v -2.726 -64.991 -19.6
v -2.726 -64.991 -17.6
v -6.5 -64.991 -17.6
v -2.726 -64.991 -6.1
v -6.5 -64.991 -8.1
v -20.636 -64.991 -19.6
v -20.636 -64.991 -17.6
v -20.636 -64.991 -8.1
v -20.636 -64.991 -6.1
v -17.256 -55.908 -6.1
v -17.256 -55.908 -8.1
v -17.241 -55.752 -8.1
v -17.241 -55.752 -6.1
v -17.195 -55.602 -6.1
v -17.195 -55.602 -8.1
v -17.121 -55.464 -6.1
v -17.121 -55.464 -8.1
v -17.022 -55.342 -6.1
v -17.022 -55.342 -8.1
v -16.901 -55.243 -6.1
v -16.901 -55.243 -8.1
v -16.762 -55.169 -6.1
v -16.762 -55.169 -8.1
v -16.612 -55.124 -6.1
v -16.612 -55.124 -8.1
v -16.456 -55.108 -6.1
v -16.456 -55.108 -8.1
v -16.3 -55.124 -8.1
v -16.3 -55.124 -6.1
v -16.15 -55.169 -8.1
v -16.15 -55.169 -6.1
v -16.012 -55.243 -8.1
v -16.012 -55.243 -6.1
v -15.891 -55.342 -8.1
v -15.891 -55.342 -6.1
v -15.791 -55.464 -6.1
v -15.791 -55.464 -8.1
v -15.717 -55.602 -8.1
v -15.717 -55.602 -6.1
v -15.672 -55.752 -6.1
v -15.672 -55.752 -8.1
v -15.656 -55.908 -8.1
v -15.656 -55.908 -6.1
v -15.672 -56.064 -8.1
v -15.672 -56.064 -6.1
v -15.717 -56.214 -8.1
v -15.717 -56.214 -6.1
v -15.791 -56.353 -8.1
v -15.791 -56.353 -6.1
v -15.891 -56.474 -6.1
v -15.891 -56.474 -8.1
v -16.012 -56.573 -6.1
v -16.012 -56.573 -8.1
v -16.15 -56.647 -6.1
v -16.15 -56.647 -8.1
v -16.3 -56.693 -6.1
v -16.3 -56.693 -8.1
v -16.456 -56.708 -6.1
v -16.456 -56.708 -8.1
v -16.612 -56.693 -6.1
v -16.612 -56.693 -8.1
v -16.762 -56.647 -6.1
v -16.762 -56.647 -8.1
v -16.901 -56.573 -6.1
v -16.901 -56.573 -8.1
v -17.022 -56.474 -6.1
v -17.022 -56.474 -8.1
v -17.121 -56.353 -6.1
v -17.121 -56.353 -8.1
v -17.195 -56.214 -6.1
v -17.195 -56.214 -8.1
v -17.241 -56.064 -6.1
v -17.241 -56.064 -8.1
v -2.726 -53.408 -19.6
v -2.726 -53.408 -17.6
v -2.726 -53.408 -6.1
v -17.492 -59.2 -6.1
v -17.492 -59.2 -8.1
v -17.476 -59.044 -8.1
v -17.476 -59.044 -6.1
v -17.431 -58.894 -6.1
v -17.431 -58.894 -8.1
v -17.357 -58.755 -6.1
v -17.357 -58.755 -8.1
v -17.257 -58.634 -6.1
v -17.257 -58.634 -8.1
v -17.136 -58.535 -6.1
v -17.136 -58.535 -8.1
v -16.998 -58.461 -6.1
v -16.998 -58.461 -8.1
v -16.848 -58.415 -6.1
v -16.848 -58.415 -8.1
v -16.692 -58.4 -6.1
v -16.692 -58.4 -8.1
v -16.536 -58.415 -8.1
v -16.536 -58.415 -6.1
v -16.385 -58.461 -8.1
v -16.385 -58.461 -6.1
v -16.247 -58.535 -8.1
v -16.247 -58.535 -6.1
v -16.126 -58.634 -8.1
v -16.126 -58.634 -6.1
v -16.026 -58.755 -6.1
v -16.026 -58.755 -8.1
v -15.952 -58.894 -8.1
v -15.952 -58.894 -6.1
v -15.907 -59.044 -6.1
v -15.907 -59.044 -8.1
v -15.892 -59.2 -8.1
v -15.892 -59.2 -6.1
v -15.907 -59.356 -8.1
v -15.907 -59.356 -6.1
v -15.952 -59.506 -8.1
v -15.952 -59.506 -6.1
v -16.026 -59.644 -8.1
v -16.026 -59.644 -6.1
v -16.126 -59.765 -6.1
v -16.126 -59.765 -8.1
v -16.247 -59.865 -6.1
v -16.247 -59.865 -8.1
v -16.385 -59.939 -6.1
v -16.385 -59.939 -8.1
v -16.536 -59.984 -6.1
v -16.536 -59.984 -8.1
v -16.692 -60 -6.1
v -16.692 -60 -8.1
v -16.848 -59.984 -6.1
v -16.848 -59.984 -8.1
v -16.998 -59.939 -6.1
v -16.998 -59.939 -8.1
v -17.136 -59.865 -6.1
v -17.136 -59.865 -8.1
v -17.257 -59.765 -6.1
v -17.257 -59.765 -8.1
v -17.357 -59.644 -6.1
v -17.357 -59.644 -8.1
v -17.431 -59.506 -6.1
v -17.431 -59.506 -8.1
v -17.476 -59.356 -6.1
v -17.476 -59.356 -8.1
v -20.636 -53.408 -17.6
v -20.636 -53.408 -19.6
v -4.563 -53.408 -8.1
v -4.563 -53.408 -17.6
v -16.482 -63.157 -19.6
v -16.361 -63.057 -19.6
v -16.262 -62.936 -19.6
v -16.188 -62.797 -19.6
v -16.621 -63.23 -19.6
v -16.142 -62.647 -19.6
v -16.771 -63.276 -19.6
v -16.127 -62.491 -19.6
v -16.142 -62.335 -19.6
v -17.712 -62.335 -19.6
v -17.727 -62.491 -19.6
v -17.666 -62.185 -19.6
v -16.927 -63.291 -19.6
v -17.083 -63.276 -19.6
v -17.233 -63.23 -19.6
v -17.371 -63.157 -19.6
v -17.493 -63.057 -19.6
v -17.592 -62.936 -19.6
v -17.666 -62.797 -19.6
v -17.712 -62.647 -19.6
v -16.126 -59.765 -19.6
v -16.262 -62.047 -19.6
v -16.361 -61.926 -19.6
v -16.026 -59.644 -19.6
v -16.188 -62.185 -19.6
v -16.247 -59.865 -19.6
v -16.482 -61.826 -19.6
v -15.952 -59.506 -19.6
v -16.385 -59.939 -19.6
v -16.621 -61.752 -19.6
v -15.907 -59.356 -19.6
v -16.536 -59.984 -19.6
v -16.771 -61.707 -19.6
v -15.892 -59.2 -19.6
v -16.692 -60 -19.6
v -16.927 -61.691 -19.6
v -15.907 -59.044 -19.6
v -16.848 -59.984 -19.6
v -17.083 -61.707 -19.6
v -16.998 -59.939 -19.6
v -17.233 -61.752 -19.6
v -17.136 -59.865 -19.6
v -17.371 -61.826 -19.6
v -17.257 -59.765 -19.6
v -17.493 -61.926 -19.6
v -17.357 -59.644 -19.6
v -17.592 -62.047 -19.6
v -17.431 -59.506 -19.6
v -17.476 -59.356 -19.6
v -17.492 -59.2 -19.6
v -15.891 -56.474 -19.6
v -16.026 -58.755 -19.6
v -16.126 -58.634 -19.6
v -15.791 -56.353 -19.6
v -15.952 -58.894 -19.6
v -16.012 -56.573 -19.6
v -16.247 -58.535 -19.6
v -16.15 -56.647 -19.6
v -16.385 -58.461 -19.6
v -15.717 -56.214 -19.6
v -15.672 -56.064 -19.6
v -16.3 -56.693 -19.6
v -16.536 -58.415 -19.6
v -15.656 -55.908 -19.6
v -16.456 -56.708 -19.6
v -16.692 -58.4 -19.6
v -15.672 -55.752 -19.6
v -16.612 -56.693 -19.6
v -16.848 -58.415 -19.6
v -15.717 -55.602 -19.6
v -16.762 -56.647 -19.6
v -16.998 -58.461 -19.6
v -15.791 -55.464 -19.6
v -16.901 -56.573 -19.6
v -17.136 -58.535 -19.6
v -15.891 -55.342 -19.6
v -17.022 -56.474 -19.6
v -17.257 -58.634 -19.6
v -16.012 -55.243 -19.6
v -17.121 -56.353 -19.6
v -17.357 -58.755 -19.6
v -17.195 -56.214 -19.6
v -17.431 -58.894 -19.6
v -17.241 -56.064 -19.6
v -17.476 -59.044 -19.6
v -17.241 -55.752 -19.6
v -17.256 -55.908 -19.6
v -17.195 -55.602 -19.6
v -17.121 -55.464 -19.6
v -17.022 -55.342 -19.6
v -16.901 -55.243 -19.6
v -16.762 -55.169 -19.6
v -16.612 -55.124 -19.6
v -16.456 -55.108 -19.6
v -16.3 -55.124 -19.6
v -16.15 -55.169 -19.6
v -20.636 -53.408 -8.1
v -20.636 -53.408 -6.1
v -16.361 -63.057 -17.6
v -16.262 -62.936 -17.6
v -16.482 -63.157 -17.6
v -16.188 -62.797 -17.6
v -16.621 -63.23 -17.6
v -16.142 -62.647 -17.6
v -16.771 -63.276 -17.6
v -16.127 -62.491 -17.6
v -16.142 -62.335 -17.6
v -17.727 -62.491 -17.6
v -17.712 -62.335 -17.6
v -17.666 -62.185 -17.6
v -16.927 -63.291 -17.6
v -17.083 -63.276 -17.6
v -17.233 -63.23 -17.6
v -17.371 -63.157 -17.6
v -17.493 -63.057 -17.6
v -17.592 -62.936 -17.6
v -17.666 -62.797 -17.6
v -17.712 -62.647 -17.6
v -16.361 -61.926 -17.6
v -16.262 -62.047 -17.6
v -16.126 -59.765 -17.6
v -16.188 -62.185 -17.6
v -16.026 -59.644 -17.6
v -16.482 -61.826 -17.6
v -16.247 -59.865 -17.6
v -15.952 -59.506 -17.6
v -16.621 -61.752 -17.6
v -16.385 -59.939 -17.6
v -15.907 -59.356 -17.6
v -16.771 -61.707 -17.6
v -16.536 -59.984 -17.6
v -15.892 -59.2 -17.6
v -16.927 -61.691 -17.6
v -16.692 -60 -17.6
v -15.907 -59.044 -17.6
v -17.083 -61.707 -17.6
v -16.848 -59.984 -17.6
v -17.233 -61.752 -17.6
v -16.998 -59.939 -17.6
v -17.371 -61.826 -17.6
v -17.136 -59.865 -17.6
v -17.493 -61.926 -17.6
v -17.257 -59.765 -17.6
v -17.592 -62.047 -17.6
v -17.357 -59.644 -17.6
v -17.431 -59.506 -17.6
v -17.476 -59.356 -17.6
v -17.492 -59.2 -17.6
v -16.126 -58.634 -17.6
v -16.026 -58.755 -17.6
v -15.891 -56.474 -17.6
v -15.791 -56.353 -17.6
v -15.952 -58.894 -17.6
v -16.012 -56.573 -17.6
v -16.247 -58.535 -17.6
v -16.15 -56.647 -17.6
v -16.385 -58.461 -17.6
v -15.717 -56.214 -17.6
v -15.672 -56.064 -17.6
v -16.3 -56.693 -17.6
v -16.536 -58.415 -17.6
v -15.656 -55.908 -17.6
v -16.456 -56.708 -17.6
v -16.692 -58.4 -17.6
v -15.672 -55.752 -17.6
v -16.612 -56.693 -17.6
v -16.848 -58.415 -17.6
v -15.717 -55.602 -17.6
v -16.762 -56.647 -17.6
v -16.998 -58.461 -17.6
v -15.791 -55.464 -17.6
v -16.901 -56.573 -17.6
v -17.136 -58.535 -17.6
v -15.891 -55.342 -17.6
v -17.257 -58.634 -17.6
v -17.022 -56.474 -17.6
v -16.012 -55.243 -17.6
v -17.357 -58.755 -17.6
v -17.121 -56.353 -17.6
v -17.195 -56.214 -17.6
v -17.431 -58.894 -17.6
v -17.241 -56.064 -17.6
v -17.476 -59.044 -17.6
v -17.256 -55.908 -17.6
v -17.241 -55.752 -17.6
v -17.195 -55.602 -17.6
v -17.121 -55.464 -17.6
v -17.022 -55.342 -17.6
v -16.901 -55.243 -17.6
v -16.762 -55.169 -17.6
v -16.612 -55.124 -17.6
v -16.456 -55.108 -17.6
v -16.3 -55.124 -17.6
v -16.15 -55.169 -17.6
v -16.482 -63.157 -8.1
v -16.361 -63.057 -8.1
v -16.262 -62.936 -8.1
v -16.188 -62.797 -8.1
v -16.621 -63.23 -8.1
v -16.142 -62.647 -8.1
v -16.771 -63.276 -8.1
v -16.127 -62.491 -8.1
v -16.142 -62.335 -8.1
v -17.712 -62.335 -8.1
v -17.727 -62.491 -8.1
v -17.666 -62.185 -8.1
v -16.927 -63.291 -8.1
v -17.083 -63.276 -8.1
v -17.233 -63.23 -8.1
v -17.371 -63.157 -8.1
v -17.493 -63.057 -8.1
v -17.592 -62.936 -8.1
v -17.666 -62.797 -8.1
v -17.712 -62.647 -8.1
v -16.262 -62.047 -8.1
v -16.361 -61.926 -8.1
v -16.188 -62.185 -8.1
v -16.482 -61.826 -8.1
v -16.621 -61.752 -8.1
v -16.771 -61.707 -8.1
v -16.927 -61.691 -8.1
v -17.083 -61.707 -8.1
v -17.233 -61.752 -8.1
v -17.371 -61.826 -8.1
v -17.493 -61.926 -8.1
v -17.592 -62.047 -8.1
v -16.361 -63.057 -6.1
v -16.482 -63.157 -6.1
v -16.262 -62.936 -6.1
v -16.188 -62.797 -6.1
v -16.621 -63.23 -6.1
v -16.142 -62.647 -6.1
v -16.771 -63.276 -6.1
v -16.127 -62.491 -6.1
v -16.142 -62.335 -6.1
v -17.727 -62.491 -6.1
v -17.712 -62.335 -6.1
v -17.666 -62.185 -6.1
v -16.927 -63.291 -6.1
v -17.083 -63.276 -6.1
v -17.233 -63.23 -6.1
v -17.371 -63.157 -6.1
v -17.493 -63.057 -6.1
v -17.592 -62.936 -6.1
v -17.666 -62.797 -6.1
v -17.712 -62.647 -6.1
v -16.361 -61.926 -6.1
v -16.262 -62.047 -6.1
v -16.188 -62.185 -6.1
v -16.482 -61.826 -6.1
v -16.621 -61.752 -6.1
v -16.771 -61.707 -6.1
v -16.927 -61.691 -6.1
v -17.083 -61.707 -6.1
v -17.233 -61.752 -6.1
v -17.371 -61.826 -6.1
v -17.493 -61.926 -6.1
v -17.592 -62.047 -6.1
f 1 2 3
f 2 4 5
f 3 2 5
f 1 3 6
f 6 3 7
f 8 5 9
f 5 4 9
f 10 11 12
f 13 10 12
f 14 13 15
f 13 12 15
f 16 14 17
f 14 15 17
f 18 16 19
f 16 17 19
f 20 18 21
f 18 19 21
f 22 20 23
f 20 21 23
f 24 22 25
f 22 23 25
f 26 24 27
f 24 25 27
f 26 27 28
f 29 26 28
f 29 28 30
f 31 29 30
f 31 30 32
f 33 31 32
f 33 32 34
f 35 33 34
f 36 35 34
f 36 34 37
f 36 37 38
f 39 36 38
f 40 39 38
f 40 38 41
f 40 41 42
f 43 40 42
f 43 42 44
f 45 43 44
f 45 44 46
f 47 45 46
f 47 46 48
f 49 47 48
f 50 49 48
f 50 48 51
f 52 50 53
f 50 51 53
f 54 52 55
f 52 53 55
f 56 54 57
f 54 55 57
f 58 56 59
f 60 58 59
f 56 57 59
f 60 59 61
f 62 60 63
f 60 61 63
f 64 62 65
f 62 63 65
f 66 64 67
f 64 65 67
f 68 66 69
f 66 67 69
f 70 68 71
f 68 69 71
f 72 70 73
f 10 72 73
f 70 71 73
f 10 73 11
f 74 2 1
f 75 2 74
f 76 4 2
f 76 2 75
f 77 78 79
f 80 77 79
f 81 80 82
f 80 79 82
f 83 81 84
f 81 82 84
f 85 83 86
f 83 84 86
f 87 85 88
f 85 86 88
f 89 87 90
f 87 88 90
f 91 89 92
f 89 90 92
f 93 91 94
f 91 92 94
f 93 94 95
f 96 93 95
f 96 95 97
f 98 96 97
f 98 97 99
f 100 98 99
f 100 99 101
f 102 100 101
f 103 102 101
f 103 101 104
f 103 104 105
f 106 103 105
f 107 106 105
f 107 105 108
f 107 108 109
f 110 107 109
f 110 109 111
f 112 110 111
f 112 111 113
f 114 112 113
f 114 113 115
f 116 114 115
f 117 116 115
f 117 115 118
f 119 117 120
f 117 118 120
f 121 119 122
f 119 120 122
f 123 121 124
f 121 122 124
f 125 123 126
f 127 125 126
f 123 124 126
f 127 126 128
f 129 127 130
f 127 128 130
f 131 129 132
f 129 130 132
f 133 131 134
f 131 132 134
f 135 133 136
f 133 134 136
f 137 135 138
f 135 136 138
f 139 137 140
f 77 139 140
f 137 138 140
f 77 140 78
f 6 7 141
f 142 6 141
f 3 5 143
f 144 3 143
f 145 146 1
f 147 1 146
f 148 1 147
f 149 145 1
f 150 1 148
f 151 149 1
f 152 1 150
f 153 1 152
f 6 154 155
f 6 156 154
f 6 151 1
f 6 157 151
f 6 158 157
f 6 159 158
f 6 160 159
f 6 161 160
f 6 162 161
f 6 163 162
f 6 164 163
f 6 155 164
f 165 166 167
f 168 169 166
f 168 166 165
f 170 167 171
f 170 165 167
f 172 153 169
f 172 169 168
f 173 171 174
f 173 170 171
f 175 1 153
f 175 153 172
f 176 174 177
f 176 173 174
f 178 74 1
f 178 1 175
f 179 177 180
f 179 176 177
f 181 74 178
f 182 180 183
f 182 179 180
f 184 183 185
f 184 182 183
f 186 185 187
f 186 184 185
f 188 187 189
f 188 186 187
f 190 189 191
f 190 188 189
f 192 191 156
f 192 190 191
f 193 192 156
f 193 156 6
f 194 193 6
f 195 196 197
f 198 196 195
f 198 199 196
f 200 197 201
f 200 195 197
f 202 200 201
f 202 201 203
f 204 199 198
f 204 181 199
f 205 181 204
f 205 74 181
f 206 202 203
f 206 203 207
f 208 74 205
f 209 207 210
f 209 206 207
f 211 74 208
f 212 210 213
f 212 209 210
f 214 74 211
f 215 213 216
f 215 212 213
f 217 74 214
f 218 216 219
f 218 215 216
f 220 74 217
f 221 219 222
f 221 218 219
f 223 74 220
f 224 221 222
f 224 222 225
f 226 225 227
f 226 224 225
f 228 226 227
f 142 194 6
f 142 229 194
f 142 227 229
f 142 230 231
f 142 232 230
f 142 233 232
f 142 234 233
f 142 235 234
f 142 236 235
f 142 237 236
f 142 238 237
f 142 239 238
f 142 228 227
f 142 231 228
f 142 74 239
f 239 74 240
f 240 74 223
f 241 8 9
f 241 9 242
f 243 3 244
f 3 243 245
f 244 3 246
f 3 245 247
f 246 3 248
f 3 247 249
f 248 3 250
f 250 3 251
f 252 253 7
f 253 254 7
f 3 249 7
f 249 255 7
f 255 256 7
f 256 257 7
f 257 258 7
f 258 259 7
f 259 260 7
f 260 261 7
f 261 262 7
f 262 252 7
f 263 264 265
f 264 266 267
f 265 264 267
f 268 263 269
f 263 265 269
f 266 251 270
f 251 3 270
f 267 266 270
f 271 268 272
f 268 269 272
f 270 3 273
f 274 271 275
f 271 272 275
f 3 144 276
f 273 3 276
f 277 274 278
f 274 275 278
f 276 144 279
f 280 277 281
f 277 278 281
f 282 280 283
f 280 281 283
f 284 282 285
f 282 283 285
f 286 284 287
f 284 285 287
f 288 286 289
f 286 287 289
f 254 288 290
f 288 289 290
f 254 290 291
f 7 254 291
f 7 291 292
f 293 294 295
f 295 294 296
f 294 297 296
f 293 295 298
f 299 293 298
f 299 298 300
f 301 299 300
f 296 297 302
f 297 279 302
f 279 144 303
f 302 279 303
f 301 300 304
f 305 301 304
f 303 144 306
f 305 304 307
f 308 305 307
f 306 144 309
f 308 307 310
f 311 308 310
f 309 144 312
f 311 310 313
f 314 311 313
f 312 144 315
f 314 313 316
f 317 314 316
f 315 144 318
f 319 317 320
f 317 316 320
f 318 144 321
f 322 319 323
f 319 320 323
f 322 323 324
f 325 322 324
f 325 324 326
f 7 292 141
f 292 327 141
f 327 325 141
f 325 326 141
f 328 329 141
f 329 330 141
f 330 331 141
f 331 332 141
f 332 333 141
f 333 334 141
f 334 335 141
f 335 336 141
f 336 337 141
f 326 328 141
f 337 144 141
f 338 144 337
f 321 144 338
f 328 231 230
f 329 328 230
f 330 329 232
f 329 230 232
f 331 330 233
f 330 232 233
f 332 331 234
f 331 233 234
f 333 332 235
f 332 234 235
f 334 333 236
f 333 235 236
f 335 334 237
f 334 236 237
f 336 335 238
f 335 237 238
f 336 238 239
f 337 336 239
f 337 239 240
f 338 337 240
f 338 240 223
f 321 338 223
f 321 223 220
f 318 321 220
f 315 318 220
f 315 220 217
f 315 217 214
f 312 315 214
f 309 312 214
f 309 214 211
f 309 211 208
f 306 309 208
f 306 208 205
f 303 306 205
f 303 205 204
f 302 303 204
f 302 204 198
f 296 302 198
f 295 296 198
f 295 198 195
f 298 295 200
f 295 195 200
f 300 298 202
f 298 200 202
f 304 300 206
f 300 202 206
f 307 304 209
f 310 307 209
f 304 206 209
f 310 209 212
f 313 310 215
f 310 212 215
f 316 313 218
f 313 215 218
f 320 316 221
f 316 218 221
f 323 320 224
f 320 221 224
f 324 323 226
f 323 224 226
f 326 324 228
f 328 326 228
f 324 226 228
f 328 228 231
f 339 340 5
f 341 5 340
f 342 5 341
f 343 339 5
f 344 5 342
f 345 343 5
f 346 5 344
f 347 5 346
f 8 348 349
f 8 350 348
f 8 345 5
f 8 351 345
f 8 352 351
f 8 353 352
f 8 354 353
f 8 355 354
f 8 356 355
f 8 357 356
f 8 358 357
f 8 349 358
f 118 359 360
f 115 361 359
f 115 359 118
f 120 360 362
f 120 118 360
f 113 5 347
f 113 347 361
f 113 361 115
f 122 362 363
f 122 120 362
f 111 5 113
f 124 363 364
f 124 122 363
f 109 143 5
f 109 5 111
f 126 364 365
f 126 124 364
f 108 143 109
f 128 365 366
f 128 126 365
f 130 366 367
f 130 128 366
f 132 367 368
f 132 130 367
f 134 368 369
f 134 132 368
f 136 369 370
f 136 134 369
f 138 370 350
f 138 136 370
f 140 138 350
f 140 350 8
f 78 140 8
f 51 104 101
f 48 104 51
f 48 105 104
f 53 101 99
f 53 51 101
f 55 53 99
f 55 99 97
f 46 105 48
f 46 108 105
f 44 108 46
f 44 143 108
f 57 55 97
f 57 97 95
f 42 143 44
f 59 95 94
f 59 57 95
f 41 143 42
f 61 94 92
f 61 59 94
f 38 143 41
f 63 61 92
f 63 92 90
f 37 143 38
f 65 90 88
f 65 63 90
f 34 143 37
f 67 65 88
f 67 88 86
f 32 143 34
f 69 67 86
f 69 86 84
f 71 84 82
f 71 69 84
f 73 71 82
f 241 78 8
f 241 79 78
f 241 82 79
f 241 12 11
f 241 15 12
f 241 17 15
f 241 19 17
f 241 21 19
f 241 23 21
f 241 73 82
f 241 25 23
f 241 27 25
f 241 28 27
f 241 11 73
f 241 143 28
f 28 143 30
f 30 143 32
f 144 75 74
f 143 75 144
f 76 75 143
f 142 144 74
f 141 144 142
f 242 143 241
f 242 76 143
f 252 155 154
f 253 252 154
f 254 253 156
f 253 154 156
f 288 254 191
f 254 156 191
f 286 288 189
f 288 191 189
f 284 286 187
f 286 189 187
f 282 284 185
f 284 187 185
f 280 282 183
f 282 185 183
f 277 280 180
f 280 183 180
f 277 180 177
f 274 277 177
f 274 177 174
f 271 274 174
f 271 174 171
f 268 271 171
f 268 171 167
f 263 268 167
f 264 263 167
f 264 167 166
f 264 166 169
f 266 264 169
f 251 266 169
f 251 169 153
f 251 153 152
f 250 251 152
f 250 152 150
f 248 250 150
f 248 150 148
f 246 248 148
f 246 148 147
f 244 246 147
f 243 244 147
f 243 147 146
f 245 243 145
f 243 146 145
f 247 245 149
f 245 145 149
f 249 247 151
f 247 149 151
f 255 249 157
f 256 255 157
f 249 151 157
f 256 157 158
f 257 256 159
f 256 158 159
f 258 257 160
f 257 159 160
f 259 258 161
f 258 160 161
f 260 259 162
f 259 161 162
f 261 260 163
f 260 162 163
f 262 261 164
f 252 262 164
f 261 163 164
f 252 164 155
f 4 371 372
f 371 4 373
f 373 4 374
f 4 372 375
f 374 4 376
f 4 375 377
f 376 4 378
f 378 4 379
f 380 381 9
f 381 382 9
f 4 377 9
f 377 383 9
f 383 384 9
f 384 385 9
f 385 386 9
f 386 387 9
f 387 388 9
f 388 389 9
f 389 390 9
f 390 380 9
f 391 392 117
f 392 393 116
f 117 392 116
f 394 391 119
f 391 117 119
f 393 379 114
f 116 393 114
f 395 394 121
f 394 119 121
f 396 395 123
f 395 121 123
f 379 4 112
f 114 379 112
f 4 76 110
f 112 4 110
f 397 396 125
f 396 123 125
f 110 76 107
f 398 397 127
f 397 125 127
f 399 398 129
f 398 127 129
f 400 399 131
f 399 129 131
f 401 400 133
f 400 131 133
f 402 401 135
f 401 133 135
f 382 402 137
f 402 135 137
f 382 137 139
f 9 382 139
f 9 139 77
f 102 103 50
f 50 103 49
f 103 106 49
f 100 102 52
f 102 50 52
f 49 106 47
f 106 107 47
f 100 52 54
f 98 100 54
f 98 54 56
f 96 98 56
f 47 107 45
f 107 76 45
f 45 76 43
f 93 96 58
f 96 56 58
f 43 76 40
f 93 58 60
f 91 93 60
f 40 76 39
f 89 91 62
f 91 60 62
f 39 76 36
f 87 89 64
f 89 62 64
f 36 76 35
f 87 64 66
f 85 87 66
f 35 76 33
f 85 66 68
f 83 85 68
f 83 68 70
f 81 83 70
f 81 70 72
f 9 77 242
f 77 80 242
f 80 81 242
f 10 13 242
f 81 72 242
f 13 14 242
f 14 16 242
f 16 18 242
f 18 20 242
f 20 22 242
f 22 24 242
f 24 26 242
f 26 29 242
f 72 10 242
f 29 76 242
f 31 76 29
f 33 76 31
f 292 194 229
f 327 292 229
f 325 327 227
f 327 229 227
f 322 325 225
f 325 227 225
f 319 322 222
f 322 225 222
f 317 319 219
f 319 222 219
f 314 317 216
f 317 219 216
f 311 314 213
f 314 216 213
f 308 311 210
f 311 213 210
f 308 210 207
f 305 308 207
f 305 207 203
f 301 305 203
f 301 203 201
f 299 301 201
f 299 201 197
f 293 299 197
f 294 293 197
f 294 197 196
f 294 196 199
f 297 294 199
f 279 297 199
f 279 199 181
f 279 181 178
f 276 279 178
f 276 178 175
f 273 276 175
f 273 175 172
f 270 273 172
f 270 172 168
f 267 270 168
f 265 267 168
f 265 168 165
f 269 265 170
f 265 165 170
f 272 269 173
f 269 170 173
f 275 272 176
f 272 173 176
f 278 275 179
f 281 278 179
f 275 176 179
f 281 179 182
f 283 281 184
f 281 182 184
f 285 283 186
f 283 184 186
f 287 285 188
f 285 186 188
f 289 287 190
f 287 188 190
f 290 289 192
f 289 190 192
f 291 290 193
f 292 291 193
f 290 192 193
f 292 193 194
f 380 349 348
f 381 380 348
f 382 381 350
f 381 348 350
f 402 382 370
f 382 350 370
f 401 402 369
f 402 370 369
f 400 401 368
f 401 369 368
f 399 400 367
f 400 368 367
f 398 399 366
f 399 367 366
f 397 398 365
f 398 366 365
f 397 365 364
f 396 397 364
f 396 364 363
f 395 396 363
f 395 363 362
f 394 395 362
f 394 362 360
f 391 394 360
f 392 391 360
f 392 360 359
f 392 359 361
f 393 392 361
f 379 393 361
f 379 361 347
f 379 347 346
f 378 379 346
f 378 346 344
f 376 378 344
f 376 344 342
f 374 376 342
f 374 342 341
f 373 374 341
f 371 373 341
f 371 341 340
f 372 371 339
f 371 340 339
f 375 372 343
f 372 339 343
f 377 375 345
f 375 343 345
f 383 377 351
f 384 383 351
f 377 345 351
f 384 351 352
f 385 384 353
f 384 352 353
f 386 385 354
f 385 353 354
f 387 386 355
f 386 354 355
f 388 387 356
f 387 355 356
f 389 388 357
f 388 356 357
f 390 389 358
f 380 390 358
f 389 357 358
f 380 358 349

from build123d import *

# Parameters (mm, degrees)
SALIENTE_EXTRUIR1_DEPTH   = 2
SALIENTE_EXTRUIR2_DEPTH   = 11.5
CROQUIS3_W                = 17.909938215
CROQUIS3_H                = 11.583193085
SALIENTE_EXTRUIR3_DEPTH   = 2
TALADRO_ROSCADO_M21_D     = 1.6
TALADRO_ROSCADO_M21_DEPTH = 17
TALADRO_ROSCADO_M21_TIP   = 0.480688495


with BuildPart() as part:
    # Croquis1 → Saliente-Extruir1 (new body)
    with BuildSketch(Plane.XY.offset(-8.1)):
        Polygon((-4.56285844, -53.408133883), (-6.500165269, -64.991326968), (-20.63641004, -64.991326968), (-20.63641004, -53.408133883), align=None)
    extrude(amount=SALIENTE_EXTRUIR1_DEPTH)

    # Croquis2 → Saliente-Extruir2 (add)
    with BuildSketch(Plane.XY.offset(-6.1)):
        Polygon((-4.56285844, -53.408133883), (-2.726471825, -53.408133883), (-2.726471825, -64.991326968), (-6.500165269, -64.991326968), align=None)
    extrude(amount=-SALIENTE_EXTRUIR2_DEPTH)

    # Croquis3 → Saliente-Extruir3 (add)
    with BuildSketch(Plane(origin=(0, 0, -17.6), x_dir=(-1, 0, 0), z_dir=(0, 0, -1))):
        with Locations((11.681440933, -59.199730426)):
            Rectangle(CROQUIS3_W, CROQUIS3_H)
    extrude(amount=SALIENTE_EXTRUIR3_DEPTH)

    # Taladro roscado M21
    with Locations(Plane.XY.offset(-6.1)):
        with Locations((-16.926929895, -62.491326968), (-16.691574413, -59.199730426), (-16.456218931, -55.908133883)):
            Hole(TALADRO_ROSCADO_M21_D / 2, depth=TALADRO_ROSCADO_M21_DEPTH)
            with Locations((0, 0, -(TALADRO_ROSCADO_M21_DEPTH + TALADRO_ROSCADO_M21_TIP / 2))):  # 118° drill point
                Cone(0, TALADRO_ROSCADO_M21_D / 2, TALADRO_ROSCADO_M21_TIP, mode=Mode.SUBTRACT)


solid = part.part
